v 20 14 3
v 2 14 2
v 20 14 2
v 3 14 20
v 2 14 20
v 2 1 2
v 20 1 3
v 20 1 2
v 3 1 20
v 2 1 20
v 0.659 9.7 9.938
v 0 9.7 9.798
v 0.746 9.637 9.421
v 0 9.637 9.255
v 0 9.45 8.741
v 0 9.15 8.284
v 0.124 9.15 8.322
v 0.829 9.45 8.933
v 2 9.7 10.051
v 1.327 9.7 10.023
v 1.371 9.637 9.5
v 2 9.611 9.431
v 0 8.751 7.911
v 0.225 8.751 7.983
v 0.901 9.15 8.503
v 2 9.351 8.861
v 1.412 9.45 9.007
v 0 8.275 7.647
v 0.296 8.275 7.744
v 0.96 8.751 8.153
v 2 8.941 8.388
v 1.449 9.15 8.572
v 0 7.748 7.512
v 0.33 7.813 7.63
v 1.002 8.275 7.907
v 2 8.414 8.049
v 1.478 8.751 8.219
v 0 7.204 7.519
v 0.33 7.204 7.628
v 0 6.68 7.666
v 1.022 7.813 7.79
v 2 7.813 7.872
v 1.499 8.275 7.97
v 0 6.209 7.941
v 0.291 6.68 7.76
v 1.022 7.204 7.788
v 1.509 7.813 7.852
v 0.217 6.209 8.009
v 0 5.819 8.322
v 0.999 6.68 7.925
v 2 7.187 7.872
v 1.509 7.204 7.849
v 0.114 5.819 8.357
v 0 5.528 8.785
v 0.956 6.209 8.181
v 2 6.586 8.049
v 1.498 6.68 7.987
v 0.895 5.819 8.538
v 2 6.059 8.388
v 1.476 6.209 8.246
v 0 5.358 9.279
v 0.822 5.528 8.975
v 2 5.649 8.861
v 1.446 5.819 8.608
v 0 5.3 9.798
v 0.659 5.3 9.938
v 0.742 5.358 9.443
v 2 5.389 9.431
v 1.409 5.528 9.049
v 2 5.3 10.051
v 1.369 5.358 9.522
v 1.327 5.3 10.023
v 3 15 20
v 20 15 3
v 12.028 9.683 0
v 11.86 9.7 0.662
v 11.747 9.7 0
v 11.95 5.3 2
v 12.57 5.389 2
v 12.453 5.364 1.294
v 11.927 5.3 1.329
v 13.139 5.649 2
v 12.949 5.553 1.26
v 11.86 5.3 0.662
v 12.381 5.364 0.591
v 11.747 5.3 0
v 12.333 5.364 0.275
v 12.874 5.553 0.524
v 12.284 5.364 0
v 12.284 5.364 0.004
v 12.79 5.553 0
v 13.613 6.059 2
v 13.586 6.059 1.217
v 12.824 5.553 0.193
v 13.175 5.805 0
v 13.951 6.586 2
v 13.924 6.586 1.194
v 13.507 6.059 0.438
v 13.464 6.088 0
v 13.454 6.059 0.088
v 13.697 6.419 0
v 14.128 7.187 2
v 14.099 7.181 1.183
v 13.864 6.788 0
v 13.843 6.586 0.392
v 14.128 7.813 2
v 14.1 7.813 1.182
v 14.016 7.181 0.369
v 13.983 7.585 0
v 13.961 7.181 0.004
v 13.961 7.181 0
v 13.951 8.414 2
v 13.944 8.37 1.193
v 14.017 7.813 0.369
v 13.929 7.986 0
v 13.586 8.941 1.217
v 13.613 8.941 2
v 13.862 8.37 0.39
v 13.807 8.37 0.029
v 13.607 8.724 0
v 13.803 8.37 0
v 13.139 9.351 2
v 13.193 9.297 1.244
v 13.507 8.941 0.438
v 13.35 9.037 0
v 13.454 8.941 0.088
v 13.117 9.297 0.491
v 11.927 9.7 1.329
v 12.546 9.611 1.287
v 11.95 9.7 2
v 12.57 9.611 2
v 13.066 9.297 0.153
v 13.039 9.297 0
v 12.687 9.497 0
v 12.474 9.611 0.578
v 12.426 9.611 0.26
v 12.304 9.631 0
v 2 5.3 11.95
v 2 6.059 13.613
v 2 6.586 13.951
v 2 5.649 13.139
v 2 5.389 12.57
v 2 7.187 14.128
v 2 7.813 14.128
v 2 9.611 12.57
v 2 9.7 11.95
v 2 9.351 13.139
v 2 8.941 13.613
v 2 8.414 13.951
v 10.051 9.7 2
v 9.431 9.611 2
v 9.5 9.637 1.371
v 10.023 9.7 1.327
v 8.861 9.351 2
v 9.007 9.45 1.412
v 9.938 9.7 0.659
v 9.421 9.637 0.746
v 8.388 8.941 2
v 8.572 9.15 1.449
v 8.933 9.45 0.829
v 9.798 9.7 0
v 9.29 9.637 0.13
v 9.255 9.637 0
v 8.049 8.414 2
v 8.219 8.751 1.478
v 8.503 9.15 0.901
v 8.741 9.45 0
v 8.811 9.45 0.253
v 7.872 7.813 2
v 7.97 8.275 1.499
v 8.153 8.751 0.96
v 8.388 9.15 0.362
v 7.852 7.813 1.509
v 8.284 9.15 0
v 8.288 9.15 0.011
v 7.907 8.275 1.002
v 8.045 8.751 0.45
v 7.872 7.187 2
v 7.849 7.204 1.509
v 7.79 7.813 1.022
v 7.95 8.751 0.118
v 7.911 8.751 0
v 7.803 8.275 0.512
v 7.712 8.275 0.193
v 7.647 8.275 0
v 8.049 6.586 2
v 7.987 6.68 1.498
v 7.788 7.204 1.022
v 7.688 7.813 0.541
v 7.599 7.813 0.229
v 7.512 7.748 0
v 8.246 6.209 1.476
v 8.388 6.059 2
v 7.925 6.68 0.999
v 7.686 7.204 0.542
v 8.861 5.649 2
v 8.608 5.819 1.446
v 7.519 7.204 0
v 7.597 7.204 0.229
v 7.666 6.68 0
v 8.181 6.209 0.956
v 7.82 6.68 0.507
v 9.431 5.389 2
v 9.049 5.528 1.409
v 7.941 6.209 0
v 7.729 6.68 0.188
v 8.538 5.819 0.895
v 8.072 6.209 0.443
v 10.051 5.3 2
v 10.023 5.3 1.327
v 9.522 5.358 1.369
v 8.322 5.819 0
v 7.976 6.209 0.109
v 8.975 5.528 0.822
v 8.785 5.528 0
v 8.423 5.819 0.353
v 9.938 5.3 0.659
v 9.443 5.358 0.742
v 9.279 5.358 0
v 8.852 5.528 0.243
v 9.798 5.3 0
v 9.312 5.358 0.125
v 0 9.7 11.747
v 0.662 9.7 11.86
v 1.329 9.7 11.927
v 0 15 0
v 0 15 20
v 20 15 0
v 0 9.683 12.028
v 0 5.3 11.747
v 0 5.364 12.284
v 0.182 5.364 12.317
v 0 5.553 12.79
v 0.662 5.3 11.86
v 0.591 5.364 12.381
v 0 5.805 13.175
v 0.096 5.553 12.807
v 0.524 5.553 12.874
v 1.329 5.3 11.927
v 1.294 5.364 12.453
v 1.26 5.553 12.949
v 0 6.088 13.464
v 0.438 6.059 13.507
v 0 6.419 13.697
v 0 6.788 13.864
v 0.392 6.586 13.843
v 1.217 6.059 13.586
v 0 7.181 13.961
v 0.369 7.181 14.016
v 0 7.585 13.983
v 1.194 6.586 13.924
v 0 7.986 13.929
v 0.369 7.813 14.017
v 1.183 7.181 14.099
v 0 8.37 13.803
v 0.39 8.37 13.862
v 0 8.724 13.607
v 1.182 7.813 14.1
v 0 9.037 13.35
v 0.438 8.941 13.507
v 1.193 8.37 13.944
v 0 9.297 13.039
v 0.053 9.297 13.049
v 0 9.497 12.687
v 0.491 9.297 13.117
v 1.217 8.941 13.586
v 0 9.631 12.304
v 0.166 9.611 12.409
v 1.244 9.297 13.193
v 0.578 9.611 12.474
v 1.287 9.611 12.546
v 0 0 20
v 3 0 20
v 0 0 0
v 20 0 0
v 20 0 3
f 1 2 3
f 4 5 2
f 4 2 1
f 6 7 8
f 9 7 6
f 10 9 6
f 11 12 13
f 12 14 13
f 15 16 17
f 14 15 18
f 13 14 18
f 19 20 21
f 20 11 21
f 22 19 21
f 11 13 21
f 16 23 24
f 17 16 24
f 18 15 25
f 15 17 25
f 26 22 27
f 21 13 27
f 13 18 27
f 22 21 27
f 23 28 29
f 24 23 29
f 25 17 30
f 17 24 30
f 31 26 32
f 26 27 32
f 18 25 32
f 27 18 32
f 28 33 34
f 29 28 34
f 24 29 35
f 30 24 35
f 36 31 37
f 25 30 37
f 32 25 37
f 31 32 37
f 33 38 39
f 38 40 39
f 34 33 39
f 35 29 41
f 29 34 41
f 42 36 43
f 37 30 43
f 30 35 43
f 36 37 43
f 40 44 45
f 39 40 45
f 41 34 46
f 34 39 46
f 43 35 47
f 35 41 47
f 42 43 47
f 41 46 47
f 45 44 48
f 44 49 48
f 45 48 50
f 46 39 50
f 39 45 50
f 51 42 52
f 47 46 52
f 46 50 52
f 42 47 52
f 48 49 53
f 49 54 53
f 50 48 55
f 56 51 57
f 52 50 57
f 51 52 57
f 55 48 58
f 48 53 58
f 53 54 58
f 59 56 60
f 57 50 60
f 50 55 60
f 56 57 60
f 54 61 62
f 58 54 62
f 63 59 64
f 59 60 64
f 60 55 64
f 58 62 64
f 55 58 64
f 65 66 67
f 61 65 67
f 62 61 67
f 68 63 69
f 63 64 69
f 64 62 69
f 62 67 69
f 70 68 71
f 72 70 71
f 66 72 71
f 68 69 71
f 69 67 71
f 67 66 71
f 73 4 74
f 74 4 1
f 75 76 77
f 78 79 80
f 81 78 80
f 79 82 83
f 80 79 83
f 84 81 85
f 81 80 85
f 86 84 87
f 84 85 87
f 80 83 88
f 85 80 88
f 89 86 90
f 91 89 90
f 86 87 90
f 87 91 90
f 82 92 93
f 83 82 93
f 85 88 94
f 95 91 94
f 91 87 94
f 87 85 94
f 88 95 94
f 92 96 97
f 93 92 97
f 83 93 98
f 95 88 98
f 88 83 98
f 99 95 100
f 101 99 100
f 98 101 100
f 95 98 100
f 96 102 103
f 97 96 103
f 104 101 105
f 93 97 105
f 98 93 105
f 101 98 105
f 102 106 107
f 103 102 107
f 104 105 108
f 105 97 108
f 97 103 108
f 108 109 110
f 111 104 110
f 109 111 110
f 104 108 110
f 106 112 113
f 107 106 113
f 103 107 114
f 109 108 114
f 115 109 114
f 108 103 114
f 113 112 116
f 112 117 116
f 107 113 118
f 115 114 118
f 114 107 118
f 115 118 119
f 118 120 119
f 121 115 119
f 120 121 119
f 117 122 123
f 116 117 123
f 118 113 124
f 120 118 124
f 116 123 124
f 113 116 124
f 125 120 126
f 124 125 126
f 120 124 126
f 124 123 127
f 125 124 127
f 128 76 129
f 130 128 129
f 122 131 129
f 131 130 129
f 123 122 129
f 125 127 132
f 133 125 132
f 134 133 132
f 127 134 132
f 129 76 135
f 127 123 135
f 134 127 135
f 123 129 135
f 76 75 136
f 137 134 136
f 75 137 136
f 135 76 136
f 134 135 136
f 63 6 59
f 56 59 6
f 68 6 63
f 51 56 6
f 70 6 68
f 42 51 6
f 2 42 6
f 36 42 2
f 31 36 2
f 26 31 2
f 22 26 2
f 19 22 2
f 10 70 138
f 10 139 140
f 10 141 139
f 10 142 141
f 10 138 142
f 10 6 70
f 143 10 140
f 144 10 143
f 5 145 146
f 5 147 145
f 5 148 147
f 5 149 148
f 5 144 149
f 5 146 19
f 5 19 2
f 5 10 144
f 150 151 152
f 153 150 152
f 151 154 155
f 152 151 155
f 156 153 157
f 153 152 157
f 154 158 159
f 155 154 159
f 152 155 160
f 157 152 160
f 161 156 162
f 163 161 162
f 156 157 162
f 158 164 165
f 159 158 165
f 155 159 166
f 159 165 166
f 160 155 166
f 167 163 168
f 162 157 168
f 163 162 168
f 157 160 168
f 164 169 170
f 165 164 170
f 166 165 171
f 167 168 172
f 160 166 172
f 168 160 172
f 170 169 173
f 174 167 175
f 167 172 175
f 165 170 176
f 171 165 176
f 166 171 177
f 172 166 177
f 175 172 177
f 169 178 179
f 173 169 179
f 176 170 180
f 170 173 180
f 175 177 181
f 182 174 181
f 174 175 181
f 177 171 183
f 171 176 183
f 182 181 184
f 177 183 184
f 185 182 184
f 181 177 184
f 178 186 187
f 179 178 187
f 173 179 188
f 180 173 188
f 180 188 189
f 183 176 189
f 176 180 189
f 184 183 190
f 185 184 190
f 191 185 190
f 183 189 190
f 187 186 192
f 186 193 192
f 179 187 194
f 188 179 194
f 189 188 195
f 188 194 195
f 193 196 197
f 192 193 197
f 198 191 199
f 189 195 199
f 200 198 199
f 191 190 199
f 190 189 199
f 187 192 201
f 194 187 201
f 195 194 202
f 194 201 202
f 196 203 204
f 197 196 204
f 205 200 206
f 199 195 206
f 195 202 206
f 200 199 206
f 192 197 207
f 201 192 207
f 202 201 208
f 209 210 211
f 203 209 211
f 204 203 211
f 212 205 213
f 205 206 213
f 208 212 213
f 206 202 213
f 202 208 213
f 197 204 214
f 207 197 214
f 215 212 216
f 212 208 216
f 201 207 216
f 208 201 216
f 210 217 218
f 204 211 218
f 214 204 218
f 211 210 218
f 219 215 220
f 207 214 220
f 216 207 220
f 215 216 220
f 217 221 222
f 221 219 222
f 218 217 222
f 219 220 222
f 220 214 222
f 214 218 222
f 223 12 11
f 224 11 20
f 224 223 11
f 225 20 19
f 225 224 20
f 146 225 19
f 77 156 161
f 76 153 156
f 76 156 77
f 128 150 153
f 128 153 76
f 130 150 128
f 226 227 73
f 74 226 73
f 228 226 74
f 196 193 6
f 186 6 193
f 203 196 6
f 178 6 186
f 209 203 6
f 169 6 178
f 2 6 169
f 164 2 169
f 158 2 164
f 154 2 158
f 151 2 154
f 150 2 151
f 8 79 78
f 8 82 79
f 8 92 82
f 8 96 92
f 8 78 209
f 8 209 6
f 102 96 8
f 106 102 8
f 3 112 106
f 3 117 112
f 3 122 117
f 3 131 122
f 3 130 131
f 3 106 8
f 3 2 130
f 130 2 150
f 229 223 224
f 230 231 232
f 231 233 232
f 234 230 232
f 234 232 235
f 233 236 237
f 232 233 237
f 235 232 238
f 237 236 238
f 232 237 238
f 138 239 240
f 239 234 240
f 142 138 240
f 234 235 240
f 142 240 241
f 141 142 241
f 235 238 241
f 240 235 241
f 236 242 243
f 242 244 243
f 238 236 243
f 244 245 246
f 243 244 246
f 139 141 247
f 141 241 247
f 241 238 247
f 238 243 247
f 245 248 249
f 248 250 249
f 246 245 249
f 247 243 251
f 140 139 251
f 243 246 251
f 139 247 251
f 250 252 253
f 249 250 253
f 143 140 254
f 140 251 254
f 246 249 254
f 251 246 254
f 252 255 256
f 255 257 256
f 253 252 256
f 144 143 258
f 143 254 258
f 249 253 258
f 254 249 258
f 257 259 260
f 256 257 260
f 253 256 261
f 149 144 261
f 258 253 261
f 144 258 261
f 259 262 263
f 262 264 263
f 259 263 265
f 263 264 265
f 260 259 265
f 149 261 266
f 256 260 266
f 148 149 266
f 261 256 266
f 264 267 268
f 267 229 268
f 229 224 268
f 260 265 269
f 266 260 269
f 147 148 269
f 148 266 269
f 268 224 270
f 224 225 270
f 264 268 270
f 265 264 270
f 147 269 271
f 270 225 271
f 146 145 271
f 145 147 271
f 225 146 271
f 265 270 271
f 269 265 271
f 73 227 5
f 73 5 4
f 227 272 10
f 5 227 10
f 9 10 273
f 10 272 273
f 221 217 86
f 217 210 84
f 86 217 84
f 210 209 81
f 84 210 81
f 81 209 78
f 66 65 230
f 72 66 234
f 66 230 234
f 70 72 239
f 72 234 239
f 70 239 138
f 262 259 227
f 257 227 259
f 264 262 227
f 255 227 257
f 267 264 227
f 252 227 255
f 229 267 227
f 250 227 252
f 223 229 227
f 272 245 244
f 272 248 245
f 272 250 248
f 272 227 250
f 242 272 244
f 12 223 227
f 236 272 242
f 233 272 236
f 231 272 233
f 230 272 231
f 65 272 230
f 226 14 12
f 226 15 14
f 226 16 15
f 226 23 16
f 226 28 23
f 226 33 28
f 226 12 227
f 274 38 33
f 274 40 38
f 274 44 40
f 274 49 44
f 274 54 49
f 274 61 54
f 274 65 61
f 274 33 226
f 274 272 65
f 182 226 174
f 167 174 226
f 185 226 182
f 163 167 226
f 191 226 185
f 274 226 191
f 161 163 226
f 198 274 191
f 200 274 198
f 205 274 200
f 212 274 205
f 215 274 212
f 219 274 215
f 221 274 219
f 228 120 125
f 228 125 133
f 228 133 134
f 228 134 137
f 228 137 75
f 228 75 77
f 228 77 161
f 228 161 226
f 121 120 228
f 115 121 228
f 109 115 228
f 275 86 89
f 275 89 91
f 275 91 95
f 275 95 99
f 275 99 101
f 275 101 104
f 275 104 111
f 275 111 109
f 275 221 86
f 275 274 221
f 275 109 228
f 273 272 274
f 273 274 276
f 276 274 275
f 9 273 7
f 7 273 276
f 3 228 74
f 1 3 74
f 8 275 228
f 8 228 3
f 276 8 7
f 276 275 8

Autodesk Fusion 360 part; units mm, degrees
sketch "Sketch1" plane through (0, 0, 0) normal (0, 1, 0) x (1, 0, 0)
  line L0 (0, 0) -> (20, 0)
  line L1 (0, -20) -> (0, 0)
  line L2 (20, 0) -> (20, -3)
  line L3 (0, -20) -> (3, -20)
  line L4 (3, -20) -> (20, -3)
extrude "Extrude1" add sketch "Sketch1" along normal blind 15
sketch "Sketch2" plane through (0, 0, 20) normal (0, 0, 1) x (1, 0, 0)
  line L0 (0, 0) -> (3, 0)
  line L1 (3, 0) -> (3, 15)
  line L2 (3, 15) -> (0, 15)
  line L3 (0, 15) -> (0, 0)
  line L4 (2, 14) -> (20, 14)
  line L5 (20, 14) -> (20, 1)
  line L6 (20, 1) -> (2, 1)
  line L7 (2, 1) -> (2, 14)
extrude "Extrude2" cut sketch "Sketch2" against normal blind 18 contours L1 L4 L6 L7 | L1 L4 L5 L6
sketch "Sketch3" plane through (0, 0, 2) normal (0, 0, 1) x (1, 0, 0)
  line L0 (2, 1) -> (20, 1)
  line L1 (20, 1) -> (20, 14)
  line L2 (20, 14) -> (2, 14)
  line L3 (2, 14) -> (2, 1)
  arc A0 (10.0508, 9.7) -> (10.0508, 5.3) centre (10.05, 7.5) ccw
  arc A1 (11.95, 5.3) -> (11.95, 9.7) centre (11.95, 7.5) ccw
  line L4 (10.0508, 9.7) -> (11.95, 9.7)
  line L5 (10.0508, 5.3) -> (11.95, 5.3)
  dimension "d5" = 4.4
  dimension "d6" = 4.4
  dimension "d8" = 1.9
  dimension "d9" = 8.05
revolve "Revolve1" cut sketch "Sketch3" angle 360 about axis through (2, 14, 2) along (0, -1, 0) contours A0 A1 L4 L5
equation "d8 = 6.3 mm - 4.4 mm"
